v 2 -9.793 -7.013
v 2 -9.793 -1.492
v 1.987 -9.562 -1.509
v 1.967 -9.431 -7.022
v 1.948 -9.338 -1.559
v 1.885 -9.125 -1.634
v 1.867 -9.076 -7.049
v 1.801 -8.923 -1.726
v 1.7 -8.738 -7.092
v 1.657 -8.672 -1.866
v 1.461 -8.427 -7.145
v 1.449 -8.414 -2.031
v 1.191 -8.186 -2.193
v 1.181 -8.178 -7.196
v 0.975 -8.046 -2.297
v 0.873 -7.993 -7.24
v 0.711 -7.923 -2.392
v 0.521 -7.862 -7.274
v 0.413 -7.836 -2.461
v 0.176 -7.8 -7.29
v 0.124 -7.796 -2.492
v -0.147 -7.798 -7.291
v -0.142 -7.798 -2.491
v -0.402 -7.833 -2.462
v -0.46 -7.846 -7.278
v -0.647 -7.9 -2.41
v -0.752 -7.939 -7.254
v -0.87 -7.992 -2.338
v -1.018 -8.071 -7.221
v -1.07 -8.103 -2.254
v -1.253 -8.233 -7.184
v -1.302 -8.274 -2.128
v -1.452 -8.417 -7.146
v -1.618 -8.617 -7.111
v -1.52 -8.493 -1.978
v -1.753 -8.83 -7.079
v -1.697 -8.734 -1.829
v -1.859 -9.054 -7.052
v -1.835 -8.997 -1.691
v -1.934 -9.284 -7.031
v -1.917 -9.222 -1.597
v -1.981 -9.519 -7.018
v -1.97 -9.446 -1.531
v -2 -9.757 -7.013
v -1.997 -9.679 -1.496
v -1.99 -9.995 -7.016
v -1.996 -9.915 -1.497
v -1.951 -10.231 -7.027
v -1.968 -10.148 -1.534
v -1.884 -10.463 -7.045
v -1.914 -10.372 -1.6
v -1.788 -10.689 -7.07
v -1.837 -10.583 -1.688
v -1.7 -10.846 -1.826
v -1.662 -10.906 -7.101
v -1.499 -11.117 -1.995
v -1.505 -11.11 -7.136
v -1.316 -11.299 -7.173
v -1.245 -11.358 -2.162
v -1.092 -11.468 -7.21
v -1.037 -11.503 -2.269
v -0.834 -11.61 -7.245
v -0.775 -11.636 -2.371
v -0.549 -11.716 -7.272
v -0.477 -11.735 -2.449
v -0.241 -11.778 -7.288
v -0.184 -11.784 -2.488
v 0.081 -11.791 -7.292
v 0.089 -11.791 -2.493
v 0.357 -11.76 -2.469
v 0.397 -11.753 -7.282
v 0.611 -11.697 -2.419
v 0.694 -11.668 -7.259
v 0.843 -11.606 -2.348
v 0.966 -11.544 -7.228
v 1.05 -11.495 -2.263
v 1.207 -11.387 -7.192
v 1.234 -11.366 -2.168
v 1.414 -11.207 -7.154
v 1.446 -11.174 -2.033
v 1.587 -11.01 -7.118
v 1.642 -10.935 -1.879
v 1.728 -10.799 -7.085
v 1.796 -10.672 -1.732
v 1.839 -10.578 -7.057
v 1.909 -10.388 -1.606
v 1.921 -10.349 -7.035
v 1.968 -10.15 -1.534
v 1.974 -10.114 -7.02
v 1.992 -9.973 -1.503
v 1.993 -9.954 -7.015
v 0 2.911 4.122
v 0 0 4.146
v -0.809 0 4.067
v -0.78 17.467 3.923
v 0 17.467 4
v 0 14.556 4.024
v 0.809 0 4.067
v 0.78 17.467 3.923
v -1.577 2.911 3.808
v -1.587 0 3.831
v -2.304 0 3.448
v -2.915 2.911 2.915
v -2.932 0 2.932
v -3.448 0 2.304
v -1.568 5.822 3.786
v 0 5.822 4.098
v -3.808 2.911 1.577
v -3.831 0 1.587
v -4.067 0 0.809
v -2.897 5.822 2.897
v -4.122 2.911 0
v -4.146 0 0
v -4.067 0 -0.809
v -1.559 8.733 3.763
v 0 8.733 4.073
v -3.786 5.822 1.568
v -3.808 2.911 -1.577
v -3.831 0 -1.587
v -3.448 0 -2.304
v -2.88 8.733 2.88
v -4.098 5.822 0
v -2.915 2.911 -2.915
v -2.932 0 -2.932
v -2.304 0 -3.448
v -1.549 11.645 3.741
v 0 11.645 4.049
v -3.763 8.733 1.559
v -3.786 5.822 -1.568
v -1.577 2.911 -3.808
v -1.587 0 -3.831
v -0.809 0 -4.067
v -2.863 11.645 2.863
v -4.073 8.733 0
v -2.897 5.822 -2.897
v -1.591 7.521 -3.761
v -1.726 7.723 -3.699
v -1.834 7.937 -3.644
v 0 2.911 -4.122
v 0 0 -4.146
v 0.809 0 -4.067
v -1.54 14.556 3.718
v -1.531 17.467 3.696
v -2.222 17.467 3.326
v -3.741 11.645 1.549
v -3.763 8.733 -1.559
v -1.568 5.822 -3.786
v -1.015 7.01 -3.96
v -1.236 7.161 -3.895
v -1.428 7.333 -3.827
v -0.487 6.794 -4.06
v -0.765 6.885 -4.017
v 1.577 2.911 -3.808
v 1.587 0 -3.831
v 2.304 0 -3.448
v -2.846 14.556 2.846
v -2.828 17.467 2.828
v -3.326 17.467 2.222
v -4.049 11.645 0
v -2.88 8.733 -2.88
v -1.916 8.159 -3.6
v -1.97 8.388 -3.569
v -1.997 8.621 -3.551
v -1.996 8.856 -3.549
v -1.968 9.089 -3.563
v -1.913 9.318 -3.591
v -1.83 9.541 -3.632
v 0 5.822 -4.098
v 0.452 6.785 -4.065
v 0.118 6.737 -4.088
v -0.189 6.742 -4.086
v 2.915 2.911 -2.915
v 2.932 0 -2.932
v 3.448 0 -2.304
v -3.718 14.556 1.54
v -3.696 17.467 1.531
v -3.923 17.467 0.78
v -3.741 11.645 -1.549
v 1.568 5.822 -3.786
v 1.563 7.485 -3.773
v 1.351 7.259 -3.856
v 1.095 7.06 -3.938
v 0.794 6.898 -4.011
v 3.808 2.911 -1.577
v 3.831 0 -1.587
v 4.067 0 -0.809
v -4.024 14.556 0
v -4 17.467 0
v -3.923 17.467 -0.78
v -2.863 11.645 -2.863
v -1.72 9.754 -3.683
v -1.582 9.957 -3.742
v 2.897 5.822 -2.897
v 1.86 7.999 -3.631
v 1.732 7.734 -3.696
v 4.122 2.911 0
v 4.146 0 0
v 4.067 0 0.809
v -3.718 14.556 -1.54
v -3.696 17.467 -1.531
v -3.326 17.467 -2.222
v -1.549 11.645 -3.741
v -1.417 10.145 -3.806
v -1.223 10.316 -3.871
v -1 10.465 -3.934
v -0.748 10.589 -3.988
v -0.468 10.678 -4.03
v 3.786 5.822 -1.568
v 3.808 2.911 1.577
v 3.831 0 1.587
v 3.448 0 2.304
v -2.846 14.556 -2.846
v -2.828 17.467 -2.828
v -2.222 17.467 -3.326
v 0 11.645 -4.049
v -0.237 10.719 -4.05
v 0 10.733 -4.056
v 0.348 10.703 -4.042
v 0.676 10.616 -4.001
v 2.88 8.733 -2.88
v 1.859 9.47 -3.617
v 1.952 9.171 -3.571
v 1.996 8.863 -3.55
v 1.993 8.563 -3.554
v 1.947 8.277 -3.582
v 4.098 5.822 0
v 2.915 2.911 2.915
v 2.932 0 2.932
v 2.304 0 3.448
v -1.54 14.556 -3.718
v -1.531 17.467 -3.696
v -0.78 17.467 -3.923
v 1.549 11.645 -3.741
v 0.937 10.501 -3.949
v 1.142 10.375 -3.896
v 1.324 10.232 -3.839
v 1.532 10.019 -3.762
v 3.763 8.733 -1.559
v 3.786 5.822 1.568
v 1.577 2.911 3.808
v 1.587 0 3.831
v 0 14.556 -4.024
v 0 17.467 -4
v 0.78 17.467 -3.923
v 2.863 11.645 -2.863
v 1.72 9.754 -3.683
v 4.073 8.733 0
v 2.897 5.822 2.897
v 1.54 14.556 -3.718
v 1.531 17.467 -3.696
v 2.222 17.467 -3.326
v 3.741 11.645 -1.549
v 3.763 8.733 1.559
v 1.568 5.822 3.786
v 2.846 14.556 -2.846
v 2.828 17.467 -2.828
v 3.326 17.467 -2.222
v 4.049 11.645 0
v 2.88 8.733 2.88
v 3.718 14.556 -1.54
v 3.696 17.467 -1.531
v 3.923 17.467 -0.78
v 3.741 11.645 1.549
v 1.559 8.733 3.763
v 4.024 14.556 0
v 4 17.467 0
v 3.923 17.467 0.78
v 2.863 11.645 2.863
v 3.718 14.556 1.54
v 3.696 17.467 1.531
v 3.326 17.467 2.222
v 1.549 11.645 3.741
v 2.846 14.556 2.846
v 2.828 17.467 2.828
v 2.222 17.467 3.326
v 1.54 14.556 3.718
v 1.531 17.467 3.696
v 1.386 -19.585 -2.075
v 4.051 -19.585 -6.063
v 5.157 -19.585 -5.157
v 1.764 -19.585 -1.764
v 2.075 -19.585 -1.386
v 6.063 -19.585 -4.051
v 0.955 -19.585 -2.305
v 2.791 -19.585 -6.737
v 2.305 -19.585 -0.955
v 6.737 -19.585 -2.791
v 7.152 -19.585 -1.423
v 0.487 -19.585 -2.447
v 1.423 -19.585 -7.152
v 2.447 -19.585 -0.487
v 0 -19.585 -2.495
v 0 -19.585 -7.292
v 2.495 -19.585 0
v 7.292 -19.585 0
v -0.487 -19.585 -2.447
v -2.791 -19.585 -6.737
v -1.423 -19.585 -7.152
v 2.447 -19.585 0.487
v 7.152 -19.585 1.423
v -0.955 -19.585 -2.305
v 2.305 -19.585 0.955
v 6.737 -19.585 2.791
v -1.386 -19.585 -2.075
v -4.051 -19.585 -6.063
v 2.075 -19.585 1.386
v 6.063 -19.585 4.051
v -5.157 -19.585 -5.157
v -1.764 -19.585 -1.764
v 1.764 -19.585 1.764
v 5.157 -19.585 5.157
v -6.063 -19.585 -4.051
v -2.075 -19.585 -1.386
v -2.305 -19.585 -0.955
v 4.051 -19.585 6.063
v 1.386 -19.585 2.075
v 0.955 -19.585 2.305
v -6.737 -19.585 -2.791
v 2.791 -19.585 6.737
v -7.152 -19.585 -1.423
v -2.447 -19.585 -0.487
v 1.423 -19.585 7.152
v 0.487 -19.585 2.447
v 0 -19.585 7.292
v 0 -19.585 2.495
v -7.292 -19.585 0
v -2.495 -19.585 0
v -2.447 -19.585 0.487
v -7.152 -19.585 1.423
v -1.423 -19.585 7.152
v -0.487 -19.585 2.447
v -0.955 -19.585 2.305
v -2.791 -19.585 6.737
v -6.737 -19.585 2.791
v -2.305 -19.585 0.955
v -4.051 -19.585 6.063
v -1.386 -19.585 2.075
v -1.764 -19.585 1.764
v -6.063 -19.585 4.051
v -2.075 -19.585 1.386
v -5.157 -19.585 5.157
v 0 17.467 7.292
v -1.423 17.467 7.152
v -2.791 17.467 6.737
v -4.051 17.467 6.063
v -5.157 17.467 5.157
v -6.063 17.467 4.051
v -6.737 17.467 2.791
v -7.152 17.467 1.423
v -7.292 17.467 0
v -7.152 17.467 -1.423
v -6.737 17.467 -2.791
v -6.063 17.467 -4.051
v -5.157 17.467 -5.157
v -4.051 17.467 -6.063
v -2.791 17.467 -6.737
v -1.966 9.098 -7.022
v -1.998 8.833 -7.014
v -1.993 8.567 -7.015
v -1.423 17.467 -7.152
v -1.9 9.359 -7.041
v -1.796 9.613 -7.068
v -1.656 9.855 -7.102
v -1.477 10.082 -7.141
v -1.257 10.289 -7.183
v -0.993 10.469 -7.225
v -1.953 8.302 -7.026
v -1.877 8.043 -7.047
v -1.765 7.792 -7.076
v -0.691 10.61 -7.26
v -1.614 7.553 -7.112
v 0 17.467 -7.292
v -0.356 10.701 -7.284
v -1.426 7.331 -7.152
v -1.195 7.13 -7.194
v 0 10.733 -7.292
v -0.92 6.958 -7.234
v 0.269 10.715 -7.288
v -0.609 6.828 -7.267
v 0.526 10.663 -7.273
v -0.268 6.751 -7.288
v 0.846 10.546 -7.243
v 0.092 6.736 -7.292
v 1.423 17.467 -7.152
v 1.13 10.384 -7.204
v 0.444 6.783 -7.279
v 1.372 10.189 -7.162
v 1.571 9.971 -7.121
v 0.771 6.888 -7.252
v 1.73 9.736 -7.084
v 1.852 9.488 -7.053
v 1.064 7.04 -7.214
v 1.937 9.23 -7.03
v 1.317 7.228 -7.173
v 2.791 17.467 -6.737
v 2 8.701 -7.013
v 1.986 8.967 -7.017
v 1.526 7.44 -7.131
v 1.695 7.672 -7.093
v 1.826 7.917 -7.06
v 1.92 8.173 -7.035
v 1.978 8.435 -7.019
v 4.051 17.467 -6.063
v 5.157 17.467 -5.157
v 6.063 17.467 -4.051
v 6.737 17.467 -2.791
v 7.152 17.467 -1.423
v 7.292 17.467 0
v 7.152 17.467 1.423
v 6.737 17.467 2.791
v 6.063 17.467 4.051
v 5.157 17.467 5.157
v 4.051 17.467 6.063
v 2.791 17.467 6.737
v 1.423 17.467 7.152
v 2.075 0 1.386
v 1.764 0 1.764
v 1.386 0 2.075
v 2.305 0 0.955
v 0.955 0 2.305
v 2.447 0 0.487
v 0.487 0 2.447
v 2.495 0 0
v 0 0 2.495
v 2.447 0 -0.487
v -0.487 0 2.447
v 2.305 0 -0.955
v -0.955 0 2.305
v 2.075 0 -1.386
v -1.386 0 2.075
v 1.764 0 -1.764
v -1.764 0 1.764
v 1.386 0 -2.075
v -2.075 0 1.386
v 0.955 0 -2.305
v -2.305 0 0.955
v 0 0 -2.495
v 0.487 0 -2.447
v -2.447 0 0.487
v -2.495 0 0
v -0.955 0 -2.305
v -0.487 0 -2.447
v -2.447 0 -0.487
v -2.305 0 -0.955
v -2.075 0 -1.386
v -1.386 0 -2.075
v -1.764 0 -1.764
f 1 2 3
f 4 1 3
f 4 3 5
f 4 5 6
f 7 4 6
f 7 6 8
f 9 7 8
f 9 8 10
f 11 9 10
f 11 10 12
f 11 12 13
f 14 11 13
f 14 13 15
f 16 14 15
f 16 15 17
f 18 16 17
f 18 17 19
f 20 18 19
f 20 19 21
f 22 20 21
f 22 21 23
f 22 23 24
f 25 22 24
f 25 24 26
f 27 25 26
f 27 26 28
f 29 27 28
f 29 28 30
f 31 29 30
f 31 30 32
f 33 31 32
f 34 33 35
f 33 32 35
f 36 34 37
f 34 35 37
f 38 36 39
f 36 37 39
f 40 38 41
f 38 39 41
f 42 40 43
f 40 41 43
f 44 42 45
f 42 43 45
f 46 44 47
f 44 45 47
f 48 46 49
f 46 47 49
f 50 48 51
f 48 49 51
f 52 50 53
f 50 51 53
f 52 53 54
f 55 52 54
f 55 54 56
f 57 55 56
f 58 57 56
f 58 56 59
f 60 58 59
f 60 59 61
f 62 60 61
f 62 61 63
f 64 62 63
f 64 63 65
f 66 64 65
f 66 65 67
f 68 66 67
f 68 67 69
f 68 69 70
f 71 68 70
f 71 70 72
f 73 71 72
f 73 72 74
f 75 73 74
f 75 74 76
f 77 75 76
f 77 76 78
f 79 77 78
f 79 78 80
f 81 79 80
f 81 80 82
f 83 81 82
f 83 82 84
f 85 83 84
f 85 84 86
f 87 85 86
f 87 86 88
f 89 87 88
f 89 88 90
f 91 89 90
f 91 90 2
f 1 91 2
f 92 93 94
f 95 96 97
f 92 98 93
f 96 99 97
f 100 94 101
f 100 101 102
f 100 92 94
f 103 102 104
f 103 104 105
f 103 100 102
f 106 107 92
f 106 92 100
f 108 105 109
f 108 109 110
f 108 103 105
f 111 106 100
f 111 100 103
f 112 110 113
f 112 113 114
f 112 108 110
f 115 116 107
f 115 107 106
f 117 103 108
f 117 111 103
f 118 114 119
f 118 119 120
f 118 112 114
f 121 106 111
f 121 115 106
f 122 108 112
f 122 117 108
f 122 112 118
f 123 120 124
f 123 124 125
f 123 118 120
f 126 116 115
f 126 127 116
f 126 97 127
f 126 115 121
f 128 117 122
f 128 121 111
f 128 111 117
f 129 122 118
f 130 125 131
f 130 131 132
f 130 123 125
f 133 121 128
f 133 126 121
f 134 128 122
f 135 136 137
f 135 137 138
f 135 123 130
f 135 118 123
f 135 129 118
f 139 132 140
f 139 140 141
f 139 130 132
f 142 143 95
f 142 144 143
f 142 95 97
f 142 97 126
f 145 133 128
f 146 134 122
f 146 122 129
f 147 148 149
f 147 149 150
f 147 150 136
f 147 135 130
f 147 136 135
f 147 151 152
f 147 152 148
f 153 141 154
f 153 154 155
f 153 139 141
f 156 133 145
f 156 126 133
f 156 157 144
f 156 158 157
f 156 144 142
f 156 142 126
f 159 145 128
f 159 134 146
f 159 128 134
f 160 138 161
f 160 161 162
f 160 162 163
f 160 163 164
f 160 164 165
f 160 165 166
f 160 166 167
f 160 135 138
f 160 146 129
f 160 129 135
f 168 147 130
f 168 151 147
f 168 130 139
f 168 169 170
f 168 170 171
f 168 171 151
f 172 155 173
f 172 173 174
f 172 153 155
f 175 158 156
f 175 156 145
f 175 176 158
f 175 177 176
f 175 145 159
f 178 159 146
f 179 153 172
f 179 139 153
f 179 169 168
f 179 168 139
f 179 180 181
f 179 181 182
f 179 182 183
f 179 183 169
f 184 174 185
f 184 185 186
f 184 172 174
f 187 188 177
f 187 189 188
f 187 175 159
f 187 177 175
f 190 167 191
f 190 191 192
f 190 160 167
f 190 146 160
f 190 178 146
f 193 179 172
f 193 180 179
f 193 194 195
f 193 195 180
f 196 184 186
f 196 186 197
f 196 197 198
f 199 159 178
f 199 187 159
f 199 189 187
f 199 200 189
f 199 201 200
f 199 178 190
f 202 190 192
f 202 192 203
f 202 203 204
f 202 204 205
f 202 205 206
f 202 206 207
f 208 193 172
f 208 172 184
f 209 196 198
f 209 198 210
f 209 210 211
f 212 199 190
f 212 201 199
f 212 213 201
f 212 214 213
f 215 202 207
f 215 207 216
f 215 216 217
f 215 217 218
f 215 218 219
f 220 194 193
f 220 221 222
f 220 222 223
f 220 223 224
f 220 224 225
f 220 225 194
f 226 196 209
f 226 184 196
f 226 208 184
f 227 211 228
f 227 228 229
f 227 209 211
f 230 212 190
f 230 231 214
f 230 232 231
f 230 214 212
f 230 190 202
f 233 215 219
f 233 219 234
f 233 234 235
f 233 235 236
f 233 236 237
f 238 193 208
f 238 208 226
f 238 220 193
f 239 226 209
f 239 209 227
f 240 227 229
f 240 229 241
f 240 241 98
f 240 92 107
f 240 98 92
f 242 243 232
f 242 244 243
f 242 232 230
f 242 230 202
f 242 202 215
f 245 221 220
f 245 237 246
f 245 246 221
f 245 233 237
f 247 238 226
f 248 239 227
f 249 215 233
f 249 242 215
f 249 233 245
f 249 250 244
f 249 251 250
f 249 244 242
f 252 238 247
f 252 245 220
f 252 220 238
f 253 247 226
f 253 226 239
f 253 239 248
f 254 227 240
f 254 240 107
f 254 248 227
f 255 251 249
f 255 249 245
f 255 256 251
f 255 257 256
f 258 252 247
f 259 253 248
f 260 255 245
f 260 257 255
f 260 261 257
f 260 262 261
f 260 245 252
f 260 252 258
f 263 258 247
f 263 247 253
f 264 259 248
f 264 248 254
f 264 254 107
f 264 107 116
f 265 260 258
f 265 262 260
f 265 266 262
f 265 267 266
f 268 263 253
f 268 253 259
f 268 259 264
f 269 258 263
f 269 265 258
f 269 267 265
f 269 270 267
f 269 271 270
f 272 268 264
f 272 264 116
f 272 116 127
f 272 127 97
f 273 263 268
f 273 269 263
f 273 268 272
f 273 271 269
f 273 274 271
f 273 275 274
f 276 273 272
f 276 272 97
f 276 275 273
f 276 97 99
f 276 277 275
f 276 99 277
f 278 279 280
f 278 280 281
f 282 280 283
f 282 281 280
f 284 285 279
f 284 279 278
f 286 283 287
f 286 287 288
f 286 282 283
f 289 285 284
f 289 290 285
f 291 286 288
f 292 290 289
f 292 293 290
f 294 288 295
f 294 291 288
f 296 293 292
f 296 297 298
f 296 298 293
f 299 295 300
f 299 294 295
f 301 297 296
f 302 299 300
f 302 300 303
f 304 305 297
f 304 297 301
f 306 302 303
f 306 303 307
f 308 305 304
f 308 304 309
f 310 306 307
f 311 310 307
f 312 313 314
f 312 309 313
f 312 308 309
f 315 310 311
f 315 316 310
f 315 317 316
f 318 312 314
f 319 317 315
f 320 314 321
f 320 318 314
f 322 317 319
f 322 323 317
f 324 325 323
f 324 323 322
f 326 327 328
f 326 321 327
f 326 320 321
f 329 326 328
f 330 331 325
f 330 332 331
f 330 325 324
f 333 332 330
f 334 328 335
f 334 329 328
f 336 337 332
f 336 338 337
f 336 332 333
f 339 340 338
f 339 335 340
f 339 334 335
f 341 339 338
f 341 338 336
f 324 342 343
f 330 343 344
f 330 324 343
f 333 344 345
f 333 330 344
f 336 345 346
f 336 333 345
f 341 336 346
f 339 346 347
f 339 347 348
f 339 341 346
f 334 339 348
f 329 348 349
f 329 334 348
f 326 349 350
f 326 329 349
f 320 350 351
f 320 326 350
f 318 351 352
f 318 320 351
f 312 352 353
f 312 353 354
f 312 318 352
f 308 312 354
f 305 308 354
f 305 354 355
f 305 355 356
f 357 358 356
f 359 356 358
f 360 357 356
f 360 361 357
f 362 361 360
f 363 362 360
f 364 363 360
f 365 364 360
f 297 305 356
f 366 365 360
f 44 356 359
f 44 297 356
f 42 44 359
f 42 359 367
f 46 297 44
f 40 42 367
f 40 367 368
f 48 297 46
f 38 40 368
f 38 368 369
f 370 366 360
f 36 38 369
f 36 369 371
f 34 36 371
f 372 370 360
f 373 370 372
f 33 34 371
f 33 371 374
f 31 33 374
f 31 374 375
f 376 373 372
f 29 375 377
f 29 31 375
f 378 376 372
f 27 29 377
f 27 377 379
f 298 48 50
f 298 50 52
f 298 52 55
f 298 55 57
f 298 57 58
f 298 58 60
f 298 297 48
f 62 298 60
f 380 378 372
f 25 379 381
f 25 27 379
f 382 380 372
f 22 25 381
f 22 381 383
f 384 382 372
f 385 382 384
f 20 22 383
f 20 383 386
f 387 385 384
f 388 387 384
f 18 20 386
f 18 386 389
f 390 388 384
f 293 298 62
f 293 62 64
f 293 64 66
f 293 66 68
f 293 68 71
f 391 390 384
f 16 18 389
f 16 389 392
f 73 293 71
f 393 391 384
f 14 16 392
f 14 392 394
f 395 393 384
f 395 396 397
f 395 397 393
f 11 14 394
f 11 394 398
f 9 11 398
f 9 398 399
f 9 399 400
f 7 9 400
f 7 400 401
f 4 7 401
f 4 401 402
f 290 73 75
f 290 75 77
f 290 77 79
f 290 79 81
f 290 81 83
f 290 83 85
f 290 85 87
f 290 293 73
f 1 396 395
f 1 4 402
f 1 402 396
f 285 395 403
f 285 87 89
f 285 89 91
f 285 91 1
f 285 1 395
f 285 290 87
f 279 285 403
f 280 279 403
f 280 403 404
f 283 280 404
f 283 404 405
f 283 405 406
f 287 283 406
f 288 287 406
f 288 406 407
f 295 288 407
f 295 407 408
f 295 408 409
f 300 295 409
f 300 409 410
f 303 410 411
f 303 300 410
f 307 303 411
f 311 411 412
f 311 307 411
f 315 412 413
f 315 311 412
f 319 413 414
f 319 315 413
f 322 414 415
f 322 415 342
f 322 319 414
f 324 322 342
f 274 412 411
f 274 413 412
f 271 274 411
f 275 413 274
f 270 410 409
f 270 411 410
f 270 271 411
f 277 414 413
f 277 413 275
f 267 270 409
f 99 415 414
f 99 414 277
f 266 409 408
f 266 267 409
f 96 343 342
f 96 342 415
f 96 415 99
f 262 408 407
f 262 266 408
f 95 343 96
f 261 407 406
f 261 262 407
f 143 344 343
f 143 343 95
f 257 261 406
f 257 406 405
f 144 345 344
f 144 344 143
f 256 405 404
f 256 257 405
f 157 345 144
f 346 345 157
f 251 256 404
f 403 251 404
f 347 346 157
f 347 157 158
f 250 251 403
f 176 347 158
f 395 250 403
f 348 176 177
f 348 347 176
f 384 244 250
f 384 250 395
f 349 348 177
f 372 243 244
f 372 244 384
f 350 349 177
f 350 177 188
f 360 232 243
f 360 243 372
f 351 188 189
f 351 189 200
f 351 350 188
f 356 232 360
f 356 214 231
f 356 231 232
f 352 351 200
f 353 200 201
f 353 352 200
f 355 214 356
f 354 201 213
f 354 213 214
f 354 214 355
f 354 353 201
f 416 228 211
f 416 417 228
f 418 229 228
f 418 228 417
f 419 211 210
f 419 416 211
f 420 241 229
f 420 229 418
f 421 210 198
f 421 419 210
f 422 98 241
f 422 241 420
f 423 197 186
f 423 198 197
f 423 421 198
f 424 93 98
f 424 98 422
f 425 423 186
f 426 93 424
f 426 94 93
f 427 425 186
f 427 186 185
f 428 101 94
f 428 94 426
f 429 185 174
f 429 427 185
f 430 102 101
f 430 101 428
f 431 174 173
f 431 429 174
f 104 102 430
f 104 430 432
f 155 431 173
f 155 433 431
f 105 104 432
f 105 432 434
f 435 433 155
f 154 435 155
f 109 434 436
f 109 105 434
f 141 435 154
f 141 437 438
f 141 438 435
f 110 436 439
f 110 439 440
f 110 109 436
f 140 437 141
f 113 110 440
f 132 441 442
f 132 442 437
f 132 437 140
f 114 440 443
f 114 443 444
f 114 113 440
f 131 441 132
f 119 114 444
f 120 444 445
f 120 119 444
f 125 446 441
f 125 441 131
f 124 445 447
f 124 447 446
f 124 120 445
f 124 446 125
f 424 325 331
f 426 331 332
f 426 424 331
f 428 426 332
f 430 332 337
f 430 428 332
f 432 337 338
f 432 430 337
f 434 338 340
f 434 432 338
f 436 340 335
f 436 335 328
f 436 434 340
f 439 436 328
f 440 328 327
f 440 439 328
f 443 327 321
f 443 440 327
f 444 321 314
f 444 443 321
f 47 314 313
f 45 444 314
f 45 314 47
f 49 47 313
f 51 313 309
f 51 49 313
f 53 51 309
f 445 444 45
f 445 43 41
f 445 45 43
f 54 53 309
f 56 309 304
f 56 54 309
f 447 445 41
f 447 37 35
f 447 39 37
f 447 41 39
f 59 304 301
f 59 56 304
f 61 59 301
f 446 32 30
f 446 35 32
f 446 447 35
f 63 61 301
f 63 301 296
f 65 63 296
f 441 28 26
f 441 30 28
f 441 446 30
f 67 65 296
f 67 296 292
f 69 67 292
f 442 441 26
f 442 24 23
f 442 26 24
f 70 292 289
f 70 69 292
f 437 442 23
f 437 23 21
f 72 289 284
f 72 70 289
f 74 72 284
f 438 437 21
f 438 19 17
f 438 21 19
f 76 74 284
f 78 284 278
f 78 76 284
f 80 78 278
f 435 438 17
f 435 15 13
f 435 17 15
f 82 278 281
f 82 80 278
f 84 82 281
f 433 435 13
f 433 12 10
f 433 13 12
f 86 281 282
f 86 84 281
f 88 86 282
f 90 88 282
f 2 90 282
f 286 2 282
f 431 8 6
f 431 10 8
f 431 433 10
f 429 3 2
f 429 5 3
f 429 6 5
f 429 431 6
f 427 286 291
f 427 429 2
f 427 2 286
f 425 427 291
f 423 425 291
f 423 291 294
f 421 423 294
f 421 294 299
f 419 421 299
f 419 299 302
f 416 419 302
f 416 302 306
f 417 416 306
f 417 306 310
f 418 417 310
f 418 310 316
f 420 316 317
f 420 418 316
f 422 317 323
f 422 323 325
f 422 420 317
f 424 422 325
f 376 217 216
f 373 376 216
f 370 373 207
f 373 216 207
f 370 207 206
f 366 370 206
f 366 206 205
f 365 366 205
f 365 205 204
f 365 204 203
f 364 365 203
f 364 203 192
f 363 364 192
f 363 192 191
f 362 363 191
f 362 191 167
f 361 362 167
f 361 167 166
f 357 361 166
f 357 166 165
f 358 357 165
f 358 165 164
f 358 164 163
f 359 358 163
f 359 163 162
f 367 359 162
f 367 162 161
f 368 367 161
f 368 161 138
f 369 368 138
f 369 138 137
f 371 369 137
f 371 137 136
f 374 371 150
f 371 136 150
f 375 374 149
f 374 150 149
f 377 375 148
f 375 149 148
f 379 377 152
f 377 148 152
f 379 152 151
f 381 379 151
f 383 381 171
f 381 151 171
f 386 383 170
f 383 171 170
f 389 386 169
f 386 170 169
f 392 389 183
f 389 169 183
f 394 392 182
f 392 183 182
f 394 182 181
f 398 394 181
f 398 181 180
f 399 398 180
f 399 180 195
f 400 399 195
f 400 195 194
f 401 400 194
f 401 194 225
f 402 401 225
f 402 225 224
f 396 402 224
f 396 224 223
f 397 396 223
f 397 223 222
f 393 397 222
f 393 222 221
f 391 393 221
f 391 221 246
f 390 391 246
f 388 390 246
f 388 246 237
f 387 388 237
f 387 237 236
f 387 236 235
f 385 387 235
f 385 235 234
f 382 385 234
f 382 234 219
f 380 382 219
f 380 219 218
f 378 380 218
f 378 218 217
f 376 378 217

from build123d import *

# Parameters (mm, degrees)
ESQUISSE2_R             = 2
ENL_V_MAT_EXTRU_1_DEPTH = 23.134437673


with BuildPart() as part:
    # Esquisse1 → Révolution1 (revolve)
    with BuildSketch(Plane.XY, mode=Mode.PRIVATE) as r_volution1_sk:
        Polygon((-2.495, -19.585017995), (-2.495, 0), (-4.146462722, 0), (-4, 17.466969529), (-7.292475615, 17.466969529), (-7.292475615, -19.585017995), align=None)
    revolve(r_volution1_sk.sketch.rotate(Axis((0, 0, 0), (0, -1, 0)), 270), axis=Axis((0, 0, 0), (0, -1, 0)))

    # Esquisse2 → Enlèv. mat.-Extru.1 (cut, through all)
    with BuildSketch(Plane.XY):
        with Locations(Location((0, 8.733484764, 0), (0, 0, 90))):
            Circle(ESQUISSE2_R)
        with Locations((0, -9.792508998)):
            Circle(ESQUISSE2_R)
    extrude(amount=-ENL_V_MAT_EXTRU_1_DEPTH, mode=Mode.SUBTRACT)


solid = part.part
